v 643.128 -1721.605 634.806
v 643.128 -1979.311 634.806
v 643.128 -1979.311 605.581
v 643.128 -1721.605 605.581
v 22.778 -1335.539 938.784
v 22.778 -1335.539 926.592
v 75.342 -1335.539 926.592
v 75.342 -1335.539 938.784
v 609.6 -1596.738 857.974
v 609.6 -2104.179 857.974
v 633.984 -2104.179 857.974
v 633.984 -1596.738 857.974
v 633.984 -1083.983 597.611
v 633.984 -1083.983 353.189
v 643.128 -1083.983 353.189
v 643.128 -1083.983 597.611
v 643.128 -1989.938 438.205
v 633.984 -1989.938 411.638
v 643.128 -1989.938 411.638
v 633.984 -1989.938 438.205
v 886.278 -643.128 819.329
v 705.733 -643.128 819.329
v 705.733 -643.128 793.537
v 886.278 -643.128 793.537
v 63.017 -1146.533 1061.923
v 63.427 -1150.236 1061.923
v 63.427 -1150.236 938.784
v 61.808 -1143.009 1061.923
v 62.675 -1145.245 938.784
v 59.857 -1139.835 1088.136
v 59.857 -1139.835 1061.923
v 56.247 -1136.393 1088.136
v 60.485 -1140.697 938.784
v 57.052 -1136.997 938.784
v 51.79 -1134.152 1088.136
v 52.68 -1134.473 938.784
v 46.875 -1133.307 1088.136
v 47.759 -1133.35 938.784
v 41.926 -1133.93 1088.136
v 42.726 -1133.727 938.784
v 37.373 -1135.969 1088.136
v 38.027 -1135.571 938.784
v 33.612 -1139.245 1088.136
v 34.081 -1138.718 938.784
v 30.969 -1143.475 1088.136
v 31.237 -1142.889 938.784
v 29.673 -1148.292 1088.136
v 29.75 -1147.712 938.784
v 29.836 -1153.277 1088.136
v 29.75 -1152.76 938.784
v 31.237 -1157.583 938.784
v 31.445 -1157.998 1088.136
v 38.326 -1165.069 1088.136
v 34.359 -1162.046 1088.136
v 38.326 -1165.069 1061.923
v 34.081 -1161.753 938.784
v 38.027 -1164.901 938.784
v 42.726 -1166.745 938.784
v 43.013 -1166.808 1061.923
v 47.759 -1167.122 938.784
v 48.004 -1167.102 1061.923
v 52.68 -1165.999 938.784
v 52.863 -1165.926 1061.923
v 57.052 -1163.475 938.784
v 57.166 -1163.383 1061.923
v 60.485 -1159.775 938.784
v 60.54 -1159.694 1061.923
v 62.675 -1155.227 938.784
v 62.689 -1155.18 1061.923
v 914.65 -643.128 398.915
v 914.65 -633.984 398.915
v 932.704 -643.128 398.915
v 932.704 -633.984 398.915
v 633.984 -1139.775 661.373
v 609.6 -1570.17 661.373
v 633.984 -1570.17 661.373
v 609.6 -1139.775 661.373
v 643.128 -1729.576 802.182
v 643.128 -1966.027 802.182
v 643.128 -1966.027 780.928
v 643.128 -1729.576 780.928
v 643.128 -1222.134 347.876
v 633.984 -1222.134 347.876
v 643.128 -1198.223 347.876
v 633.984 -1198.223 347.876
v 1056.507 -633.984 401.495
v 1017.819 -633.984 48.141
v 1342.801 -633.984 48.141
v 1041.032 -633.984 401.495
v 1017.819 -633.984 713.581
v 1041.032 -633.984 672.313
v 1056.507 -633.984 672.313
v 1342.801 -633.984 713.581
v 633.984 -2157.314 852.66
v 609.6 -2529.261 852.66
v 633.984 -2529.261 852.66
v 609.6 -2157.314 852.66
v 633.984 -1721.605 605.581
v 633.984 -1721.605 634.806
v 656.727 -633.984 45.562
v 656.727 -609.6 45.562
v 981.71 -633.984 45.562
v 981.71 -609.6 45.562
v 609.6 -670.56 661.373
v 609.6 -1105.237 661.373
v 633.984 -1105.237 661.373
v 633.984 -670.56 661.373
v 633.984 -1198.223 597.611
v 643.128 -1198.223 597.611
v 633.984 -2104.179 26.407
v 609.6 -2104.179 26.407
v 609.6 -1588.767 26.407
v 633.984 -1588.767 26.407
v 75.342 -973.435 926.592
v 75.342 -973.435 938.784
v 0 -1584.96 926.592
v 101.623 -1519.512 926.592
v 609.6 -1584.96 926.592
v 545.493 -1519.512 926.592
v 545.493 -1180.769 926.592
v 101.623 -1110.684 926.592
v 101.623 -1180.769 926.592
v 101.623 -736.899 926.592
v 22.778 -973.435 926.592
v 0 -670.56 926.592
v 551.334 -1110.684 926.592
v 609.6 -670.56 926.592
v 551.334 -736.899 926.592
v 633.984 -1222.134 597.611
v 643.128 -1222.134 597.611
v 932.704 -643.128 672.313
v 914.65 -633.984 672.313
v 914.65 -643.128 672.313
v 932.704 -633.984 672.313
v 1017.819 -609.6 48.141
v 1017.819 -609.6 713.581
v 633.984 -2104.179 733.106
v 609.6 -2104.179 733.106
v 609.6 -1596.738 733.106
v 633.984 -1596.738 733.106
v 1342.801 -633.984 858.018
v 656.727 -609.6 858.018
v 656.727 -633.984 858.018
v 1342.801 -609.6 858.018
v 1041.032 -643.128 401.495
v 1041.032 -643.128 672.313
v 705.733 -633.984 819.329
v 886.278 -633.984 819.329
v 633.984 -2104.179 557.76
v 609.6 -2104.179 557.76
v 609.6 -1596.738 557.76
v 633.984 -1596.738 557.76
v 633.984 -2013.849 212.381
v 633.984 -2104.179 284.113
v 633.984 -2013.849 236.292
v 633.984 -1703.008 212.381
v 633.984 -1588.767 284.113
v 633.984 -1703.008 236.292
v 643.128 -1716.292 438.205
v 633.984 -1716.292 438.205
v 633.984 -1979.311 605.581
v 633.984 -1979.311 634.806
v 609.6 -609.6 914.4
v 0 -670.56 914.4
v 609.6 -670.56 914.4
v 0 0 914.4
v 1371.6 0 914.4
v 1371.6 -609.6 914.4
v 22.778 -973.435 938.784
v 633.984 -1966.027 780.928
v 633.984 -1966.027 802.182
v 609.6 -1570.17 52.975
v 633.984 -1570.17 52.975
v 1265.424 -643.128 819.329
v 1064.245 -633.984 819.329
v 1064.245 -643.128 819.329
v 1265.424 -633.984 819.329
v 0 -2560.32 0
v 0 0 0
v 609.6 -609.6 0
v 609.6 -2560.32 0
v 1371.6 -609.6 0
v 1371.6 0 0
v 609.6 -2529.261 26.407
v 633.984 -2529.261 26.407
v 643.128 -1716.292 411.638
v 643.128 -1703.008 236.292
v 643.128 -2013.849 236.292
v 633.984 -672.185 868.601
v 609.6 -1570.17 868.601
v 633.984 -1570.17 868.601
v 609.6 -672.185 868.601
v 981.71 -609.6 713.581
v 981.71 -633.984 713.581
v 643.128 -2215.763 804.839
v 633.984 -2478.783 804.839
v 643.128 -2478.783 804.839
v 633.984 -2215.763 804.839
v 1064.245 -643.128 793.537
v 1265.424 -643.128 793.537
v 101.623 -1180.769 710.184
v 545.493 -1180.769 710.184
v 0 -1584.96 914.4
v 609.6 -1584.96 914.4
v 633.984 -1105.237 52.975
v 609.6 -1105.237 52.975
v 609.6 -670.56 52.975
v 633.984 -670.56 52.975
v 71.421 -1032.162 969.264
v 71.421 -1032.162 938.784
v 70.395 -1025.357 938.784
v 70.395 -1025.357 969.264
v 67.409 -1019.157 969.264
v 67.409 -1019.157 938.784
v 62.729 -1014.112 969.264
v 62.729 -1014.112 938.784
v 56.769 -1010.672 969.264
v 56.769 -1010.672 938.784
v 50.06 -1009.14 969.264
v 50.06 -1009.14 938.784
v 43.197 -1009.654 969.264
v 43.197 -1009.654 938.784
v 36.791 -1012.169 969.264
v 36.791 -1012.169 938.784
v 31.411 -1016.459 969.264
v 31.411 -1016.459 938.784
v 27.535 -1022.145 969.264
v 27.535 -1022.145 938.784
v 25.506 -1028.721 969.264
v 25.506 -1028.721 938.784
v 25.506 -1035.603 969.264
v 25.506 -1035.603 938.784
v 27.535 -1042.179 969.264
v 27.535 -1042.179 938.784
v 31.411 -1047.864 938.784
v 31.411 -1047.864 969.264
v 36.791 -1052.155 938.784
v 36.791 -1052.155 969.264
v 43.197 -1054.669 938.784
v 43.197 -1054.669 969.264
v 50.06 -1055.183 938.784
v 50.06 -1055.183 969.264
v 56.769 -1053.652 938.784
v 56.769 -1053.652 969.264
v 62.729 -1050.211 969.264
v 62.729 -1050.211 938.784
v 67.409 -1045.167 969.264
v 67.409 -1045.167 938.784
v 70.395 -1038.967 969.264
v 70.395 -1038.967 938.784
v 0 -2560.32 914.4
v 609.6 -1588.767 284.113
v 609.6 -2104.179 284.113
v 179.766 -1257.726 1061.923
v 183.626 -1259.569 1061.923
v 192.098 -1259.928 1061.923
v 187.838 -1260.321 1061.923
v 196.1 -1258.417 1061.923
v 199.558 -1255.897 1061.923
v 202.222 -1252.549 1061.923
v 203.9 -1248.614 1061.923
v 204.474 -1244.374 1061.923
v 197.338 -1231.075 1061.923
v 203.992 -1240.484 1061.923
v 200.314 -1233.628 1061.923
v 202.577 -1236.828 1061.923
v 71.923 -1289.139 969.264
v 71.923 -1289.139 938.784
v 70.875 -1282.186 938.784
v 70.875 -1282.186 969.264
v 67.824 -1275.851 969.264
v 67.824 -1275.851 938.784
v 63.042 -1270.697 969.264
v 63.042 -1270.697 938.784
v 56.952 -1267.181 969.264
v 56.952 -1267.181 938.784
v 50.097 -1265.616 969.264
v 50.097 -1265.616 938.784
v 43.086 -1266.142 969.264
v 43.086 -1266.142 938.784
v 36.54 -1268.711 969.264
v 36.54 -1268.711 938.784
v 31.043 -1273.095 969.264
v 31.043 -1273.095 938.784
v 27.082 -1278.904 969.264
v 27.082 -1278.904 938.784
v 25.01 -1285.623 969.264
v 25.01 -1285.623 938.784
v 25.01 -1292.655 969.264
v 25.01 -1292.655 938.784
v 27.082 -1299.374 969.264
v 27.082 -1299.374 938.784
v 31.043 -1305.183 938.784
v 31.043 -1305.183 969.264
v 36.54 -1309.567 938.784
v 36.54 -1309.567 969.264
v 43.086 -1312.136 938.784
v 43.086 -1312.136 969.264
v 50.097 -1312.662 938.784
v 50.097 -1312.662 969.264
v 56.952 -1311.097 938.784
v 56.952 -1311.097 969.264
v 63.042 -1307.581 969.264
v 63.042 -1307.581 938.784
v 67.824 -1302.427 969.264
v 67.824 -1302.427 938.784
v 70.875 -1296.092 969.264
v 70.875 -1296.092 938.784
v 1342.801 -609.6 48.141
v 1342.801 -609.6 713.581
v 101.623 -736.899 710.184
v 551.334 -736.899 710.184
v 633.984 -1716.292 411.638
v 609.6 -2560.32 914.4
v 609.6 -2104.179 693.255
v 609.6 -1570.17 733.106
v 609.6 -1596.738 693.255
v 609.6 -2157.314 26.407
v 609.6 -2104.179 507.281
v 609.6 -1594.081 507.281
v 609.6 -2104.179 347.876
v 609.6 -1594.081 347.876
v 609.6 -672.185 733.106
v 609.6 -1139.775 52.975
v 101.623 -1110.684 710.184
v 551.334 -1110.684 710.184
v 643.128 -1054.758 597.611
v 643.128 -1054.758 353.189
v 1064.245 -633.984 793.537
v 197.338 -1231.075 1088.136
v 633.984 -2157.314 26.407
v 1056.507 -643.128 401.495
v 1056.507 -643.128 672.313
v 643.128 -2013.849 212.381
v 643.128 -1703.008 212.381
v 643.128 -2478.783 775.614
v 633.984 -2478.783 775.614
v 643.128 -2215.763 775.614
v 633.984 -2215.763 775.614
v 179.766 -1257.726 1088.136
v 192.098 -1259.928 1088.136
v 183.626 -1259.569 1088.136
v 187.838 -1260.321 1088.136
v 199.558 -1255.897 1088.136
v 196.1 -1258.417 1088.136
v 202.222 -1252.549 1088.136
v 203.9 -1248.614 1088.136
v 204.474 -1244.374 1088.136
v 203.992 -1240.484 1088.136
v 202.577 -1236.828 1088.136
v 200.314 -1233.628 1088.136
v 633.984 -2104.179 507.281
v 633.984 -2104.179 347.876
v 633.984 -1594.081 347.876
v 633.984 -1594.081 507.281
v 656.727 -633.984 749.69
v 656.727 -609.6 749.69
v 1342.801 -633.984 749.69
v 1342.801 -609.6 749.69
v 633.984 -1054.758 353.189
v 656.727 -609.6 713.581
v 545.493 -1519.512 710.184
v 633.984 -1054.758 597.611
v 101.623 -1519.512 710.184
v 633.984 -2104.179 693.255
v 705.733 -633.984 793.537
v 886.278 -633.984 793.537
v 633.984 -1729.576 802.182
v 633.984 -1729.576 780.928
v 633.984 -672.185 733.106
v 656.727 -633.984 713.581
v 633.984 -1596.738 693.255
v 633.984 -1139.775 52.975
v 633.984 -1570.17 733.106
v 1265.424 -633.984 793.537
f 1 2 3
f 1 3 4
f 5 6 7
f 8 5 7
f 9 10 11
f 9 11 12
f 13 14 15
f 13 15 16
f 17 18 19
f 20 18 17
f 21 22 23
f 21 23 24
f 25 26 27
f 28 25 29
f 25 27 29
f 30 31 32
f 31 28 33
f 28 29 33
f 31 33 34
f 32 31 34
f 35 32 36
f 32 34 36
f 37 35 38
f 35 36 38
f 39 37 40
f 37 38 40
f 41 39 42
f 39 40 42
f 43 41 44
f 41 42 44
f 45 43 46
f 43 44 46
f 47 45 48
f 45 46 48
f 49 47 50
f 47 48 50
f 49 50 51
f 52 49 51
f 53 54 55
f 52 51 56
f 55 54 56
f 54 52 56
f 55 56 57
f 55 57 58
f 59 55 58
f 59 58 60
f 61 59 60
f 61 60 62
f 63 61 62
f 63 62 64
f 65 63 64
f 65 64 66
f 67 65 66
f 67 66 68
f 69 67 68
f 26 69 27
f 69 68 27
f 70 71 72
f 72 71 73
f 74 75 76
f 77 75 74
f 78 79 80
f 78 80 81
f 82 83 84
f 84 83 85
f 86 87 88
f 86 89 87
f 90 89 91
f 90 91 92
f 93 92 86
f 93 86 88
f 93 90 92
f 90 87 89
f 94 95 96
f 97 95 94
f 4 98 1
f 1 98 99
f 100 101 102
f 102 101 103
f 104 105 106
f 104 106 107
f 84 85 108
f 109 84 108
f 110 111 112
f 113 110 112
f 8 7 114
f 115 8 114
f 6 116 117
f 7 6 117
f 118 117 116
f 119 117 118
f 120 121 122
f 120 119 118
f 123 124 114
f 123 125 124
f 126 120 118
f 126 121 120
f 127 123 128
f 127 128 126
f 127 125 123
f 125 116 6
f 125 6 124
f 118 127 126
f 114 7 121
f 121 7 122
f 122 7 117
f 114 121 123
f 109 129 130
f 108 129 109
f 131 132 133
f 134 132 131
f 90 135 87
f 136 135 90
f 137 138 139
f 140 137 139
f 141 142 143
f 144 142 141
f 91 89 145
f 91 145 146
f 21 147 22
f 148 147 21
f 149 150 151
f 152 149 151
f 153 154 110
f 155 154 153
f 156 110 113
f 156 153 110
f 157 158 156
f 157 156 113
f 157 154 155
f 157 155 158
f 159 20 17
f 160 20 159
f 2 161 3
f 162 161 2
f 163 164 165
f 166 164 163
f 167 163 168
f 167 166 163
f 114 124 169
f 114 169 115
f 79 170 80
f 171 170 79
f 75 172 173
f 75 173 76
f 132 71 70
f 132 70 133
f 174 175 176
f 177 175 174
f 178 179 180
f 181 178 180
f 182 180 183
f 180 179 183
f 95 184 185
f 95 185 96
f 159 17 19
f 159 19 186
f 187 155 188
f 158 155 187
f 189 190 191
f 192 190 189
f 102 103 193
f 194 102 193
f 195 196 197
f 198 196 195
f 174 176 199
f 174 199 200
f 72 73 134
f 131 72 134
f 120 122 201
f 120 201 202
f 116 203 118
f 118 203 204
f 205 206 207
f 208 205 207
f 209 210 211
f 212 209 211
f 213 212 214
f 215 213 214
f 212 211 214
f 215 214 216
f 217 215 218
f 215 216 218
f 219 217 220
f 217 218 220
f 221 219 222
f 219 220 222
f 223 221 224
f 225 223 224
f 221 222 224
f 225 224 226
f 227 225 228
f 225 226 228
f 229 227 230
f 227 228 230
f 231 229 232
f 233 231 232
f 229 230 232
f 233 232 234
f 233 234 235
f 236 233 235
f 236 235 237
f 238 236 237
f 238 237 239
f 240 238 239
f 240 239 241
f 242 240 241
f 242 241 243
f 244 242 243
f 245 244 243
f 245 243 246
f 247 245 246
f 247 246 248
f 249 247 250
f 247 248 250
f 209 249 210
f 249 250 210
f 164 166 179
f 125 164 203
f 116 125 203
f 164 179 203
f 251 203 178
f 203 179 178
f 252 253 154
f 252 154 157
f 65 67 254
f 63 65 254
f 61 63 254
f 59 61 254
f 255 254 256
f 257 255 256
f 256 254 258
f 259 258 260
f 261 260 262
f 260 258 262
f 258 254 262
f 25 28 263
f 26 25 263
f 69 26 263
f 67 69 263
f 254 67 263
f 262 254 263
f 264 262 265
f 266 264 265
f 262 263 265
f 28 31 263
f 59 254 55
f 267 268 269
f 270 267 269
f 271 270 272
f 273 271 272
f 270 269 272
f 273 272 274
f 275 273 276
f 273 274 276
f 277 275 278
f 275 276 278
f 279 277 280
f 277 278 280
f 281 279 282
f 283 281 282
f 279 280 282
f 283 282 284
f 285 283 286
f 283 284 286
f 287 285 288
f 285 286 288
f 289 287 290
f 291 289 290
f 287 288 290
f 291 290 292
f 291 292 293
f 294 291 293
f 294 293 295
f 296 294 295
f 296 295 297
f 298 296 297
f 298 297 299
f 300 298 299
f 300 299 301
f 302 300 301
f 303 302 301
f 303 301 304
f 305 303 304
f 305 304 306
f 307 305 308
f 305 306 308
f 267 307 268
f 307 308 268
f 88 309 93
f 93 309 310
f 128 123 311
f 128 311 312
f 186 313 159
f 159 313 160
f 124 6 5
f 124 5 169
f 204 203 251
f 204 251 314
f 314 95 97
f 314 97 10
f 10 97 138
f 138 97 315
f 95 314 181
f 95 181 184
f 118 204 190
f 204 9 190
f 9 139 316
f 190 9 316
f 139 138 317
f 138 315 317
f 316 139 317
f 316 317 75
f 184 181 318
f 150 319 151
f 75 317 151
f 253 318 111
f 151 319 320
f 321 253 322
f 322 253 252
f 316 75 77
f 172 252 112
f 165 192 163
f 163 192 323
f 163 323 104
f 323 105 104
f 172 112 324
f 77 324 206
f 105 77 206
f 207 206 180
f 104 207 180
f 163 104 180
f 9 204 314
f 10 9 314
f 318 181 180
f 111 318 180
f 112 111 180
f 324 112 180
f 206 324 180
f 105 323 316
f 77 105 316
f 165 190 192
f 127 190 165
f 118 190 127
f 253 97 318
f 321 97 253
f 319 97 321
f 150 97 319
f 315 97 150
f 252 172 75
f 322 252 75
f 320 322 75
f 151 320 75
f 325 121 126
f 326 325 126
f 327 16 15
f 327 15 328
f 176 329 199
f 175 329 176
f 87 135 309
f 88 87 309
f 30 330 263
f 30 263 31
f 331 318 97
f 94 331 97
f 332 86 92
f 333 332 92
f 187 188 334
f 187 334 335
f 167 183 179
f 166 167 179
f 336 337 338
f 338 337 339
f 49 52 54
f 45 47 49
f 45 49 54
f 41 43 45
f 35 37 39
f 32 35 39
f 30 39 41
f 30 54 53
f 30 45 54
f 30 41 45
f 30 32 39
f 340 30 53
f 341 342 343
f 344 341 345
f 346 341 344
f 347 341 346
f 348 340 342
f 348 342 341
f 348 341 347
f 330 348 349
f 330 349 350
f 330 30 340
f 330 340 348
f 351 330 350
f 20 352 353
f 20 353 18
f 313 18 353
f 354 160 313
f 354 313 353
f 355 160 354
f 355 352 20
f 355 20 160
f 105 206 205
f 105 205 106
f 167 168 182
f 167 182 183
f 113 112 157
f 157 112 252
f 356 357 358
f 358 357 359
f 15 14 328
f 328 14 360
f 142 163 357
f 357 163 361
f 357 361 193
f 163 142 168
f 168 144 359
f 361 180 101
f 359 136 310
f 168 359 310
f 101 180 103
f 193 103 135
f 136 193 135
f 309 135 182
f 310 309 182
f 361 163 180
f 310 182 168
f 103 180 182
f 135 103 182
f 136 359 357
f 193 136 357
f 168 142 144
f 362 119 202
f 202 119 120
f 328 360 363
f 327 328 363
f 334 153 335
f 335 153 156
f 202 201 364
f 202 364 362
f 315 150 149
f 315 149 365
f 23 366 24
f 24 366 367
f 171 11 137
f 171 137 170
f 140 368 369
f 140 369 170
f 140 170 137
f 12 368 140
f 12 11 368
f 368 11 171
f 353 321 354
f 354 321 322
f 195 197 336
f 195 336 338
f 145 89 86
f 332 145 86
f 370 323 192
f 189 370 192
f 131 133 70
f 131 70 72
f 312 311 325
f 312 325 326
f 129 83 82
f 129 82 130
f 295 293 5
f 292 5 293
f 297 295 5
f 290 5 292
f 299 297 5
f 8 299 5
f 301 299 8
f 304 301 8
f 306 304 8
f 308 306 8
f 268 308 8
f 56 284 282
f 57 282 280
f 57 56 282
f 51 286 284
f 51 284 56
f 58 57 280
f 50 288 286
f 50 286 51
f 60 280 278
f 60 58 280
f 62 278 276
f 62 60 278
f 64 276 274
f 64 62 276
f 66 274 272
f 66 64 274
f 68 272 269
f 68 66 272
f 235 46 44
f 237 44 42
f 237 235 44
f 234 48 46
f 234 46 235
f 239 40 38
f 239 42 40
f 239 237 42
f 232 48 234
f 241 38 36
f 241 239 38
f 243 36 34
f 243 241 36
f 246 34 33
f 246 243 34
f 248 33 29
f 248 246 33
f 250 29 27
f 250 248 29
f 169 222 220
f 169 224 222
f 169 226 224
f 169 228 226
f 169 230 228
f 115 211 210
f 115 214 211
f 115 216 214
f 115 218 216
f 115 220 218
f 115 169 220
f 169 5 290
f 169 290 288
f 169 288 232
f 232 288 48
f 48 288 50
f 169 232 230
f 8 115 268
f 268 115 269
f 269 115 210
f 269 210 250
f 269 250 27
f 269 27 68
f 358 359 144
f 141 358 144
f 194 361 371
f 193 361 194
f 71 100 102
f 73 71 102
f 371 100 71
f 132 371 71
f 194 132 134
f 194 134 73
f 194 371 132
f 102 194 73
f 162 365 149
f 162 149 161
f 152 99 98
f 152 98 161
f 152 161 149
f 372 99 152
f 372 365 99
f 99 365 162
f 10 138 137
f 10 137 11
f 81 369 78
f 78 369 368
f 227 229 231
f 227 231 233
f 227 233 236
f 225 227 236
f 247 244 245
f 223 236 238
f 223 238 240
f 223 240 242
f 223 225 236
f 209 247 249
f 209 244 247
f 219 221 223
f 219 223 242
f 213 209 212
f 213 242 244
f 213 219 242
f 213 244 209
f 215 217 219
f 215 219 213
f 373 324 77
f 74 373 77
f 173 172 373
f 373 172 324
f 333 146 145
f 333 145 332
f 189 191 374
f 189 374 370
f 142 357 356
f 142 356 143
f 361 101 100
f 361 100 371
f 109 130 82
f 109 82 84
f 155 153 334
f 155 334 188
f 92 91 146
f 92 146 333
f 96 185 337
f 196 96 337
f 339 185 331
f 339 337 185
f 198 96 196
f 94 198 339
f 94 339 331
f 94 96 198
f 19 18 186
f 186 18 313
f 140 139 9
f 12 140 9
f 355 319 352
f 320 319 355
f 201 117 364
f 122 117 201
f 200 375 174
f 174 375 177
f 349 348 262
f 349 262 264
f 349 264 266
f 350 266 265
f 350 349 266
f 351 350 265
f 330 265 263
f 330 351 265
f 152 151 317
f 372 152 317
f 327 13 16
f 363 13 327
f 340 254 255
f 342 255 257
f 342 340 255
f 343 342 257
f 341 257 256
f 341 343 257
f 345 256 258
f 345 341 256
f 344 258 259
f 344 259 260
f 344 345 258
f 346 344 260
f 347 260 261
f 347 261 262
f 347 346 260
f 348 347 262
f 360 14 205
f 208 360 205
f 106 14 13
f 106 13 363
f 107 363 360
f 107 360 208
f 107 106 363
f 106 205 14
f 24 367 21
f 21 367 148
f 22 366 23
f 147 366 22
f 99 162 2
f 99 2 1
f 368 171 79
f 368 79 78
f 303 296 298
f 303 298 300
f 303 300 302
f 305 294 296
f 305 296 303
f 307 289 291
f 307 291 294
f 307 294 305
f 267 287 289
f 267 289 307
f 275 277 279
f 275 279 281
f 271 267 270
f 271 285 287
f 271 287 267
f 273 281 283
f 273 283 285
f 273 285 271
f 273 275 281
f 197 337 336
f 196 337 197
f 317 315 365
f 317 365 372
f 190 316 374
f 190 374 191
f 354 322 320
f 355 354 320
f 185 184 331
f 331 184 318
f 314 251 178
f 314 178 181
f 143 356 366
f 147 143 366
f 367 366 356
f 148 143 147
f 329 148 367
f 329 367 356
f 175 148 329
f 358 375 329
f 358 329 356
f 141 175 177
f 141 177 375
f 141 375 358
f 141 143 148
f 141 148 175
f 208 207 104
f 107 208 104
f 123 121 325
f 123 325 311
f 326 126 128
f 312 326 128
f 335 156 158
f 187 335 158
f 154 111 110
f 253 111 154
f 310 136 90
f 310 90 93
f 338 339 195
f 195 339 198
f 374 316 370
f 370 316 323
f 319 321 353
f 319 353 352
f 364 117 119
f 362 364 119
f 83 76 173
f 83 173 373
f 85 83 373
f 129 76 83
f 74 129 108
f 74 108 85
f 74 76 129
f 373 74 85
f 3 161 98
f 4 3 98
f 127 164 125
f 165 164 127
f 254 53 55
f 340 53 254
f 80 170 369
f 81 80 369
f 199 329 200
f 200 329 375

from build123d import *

# Parameters (mm, degrees)
F1_DEPTH  = 914.4
F2_W      = 609.6
F2_H      = 914.4
F3_DEPTH  = 12.192
F4_W      = 449.7101977468
F4_H      = 373.7850785255
F4_W_2    = 443.8698366284
F4_H_2    = 338.7427330017
F5_DEPTH  = 216.408
F6_W      = 52.5635313243
F6_H      = 362.1043562889
F7_DEPTH  = 12.192
F8_R      = 23.0861933735
F8_R_2    = 23.5885121879
F9_DEPTH  = 30.48
F10_R     = 16.9333495062
F11_DEPTH = 149.352
F13_DEPTH = 26.2128
F14_W     = 897.9855179787
F14_H     = 135.4948282242
F14_W_2   = 430.3954839706
F14_H_2   = 608.3984486759
F14_W_3   = 434.6766495132
F14_W_4   = 507.4415206909
F14_H_3   = 124.8677968979
F14_W_5   = 510.0982189178
F14_H_4   = 159.405708313
F14_W_6   = 515.4118537903
F14_H_5   = 257.705911994
F14_W_7   = 371.946811676
F14_H_6   = 826.2529522181
F15_DEPTH = 24.384
F16_W     = 263.0195617676
F16_H     = 29.2243361473
F16_W_2   = 236.4517450333
F16_H_2   = 21.2540626526
F16_W_3   = 257.7059268951
F16_H_3   = 29.224395752
F16_W_4   = 273.6464738846
F16_H_4   = 26.5676081181
F16_W_5   = 310.8410835266
F16_H_5   = 23.9108502865
F16_W_6   = 23.9108800888
F16_H_6   = 249.7356235981
F16_W_7   = 29.224395752
F16_H_7   = 244.4220781326
F17_DEPTH = 33.528
F18_W     = 686.0738992691
F18_H     = 108.3274483681
F18_W_2   = 324.9823451042
F18_H_2   = 668.0193580687
F18_W_3   = 324.9824047089
F18_H_3   = 665.4401309788
F19_DEPTH = 24.384
F20_W     = 180.5458068848
F20_H     = 25.7922410965
F20_W_2   = 201.1796236038
F20_W_3   = 18.0545449257
F20_H_2   = 273.3978629112
F20_W_4   = 15.4753923416
F20_H_3   = 270.8186507225
F21_DEPTH = 33.528


with BuildPart() as f1:
    # F0 (on Top) → F1 (new body)
    with BuildSketch(Plane.XY):
        Polygon((1371.6, 0), (0, 0), (0, -2560.32), (609.6, -2560.32), (609.6, -609.6), (1371.6, -609.6), align=None)
    extrude(amount=F1_DEPTH)

    # F2 (on face) → F3 (join)
    with BuildSketch(Plane.XY.offset(914.4)):
        with Locations((304.8, -1127.76)):
            Rectangle(F2_W, F2_H)
    extrude(amount=F3_DEPTH)

    # F4 (on face) → F5 (cut)
    with BuildSketch(Plane.XY.offset(926.592)):
        with Locations((326.4784477651, -923.7917363644)):
            Rectangle(F4_W, F4_H)
        with Locations((323.558267206, -1350.1404523849)):
            Rectangle(F4_W_2, F4_H_2)
    extrude(amount=-F5_DEPTH, mode=Mode.SUBTRACT)

    # F6 (on face) → F7 (join)
    with BuildSketch(Plane.XY.offset(926.592)):
        with Locations((49.0598166361, -1154.4872820377)):
            Rectangle(F6_W, F6_H)
    extrude(amount=F7_DEPTH)

    # F8 (on face) → F9 (join)
    with BuildSketch(Plane.XY.offset(938.784)):
        with Locations((48.3345501125, -1032.1618318558)):
            Circle(F8_R)
        with Locations((48.3345501125, -1289.1390323639)):
            Circle(F8_R_2)
    extrude(amount=F9_DEPTH)

    # F10 (on face) → F11 (join)
    with BuildSketch(Plane.XY.offset(938.784)):
        with Locations((46.4938916266, -1150.2358913422)):
            Circle(F10_R)
    extrude(amount=F11_DEPTH)

    # F12 (on face) → F13 (join)
    with BuildSketch(Plane.XY.offset(1088.136)):
        with BuildLine():
            ThreePointArc((179.7659053915, -1257.725767202), (175.1870617422, -1235.5880011729), (197.3383816738, -1231.0751839585))
            Line((197.3383816738, -1231.0751839585), (59.8566564425, -1139.8351778101))
            ThreePointArc((59.8566564425, -1139.8351778101), (62.5097383494, -1144.737620773), (63.4272411328, -1150.2358913422))
            ThreePointArc((63.4272411328, -1150.2358913422), (55.1088743441, -1164.8139707176), (38.3264306642, -1165.0693301521))
            Line((38.3264306642, -1165.0693301521), (179.7659053915, -1257.725767202))
        make_face()
        with BuildLine():
            ThreePointArc((179.7659053915, -1257.725767202), (196.100490997, -1258.4165256424), (204.473729656, -1244.374278369))
            ThreePointArc((204.473729656, -1244.374278369), (202.577222106, -1236.8281021359), (197.3383816738, -1231.0751839585))
            ThreePointArc((197.3383816738, -1231.0751839585), (175.1870617422, -1235.5880011729), (179.7659053915, -1257.725767202))
        make_face()
    extrude(amount=-F13_DEPTH)

    # F14 (on face) → F15 (join)
    with BuildSketch(Plane.YZ.offset(609.6)):
        with Locations((-1121.1772859097, 800.8534312248)):
            Rectangle(F14_W, F14_H)
        with Locations((-1354.9723029137, 357.174212113)):
            Rectangle(F14_W_2, F14_H_2)
        with Locations((-887.8983247566, 357.174212113)):
            Rectangle(F14_W_3, F14_H_2)
        with Locations((-1850.4583835602, 795.5399155617)):
            Rectangle(F14_W_4, F14_H_3)
        with Locations((-1850.4583835602, 625.5071759224)):
            Rectangle(F14_W_4, F14_H)
        with Locations((-1849.1300344467, 427.5783896446)):
            Rectangle(F14_W_5, F14_H_4)
        with Locations((-1846.4732170105, 155.2603021264)):
            Rectangle(F14_W_6, F14_H_5)
        with Locations((-2343.2877063751, 439.5338222384)):
            Rectangle(F14_W_7, F14_H_6)
    extrude(amount=F15_DEPTH)

    # F16 (on face) → F17 (join)
    with BuildSketch(Plane.YZ.offset(609.6)):
        with Locations((-2347.2728729248, 790.2264297009)):
            Rectangle(F16_W, F16_H)
        with Locations((-1847.8016257286, 791.5548086166)):
            Rectangle(F16_W_2, F16_H_2)
        with Locations((-1850.4583835602, 620.1936602592)):
            Rectangle(F16_W_3, F16_H_3)
        with Locations((-1853.1151413918, 424.9216765165)):
            Rectangle(F16_W_4, F16_H_4)
        with Locations((-1858.4287166595, 224.3361473083)):
            Rectangle(F16_W_5, F16_H_5)
        with Locations((-1210.1787924767, 472.7433770895)):
            Rectangle(F16_W_6, F16_H_6)
        with Locations((-1069.3703889847, 475.4001498222)):
            Rectangle(F16_W_7, F16_H_7)
    extrude(amount=F17_DEPTH)

    # F18 (on face) → F19 (join)
    with BuildSketch(Plane.XZ.offset(609.6)):
        with Locations((999.7642636299, 803.8538396358)):
            Rectangle(F18_W, F18_H)
        with Locations((819.2184865475, 379.5712869614)):
            Rectangle(F18_W_2, F18_H_2)
        with Locations((1180.31001091, 380.8609005064)):
            Rectangle(F18_W_3, F18_H_3)
    extrude(amount=F19_DEPTH)

    # F20 (on face) → F21 (join)
    with BuildSketch(Plane.XZ.offset(609.6)):
        with Locations((796.005487442, 806.4330220222)):
            Rectangle(F20_W, F20_H)
        with Locations((1164.8346781731, 806.4330220222)):
            Rectangle(F20_W_2, F20_H)
        with Locations((923.6771166325, 535.6144011021)):
            Rectangle(F20_W_3, F20_H_2)
        with Locations((1048.7695336342, 536.9040071964)):
            Rectangle(F20_W_4, F20_H_3)
    extrude(amount=F21_DEPTH)


solid = f1.part
